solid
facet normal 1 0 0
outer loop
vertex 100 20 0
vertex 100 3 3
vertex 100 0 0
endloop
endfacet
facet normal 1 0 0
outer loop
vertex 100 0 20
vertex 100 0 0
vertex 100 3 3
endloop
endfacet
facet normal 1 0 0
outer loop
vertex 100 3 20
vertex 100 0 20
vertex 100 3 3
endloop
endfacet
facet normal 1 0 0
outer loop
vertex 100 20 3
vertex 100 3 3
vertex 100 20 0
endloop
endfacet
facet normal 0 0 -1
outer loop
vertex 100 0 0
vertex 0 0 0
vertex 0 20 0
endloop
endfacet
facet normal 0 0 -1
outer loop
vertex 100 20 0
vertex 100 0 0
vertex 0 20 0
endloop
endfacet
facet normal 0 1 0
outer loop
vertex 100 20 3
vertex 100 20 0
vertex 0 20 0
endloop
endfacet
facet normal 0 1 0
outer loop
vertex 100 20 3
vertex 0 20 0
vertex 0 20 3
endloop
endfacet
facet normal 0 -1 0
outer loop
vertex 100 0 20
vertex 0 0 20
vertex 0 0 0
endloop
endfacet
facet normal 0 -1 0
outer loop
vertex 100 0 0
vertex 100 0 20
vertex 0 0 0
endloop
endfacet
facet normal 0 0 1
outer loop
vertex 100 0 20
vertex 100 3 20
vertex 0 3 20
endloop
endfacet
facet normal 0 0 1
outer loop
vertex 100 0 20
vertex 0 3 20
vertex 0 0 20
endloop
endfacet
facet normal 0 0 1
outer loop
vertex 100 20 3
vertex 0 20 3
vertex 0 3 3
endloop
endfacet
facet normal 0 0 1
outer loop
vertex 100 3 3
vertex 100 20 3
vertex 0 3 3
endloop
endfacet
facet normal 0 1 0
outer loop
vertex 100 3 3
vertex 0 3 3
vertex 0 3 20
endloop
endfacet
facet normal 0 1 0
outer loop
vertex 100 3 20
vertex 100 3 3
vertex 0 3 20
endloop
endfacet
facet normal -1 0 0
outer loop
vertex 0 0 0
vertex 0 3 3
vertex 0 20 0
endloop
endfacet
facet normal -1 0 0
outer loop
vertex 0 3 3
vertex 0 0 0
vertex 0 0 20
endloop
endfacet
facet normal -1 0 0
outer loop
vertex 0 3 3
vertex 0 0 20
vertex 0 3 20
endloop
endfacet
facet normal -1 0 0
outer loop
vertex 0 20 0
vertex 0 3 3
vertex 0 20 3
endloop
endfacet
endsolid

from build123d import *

# Parameters (mm, degrees)
PAD_DEPTH = 100


with BuildPart() as part:
    # Sketch → Pad (new body)
    with BuildSketch(Plane.YZ):
        Polygon((0, 0), (20, 0), (20, 3), (3, 3), (3, 20), (0, 20), align=None)
    extrude(amount=PAD_DEPTH)


solid = part.part
